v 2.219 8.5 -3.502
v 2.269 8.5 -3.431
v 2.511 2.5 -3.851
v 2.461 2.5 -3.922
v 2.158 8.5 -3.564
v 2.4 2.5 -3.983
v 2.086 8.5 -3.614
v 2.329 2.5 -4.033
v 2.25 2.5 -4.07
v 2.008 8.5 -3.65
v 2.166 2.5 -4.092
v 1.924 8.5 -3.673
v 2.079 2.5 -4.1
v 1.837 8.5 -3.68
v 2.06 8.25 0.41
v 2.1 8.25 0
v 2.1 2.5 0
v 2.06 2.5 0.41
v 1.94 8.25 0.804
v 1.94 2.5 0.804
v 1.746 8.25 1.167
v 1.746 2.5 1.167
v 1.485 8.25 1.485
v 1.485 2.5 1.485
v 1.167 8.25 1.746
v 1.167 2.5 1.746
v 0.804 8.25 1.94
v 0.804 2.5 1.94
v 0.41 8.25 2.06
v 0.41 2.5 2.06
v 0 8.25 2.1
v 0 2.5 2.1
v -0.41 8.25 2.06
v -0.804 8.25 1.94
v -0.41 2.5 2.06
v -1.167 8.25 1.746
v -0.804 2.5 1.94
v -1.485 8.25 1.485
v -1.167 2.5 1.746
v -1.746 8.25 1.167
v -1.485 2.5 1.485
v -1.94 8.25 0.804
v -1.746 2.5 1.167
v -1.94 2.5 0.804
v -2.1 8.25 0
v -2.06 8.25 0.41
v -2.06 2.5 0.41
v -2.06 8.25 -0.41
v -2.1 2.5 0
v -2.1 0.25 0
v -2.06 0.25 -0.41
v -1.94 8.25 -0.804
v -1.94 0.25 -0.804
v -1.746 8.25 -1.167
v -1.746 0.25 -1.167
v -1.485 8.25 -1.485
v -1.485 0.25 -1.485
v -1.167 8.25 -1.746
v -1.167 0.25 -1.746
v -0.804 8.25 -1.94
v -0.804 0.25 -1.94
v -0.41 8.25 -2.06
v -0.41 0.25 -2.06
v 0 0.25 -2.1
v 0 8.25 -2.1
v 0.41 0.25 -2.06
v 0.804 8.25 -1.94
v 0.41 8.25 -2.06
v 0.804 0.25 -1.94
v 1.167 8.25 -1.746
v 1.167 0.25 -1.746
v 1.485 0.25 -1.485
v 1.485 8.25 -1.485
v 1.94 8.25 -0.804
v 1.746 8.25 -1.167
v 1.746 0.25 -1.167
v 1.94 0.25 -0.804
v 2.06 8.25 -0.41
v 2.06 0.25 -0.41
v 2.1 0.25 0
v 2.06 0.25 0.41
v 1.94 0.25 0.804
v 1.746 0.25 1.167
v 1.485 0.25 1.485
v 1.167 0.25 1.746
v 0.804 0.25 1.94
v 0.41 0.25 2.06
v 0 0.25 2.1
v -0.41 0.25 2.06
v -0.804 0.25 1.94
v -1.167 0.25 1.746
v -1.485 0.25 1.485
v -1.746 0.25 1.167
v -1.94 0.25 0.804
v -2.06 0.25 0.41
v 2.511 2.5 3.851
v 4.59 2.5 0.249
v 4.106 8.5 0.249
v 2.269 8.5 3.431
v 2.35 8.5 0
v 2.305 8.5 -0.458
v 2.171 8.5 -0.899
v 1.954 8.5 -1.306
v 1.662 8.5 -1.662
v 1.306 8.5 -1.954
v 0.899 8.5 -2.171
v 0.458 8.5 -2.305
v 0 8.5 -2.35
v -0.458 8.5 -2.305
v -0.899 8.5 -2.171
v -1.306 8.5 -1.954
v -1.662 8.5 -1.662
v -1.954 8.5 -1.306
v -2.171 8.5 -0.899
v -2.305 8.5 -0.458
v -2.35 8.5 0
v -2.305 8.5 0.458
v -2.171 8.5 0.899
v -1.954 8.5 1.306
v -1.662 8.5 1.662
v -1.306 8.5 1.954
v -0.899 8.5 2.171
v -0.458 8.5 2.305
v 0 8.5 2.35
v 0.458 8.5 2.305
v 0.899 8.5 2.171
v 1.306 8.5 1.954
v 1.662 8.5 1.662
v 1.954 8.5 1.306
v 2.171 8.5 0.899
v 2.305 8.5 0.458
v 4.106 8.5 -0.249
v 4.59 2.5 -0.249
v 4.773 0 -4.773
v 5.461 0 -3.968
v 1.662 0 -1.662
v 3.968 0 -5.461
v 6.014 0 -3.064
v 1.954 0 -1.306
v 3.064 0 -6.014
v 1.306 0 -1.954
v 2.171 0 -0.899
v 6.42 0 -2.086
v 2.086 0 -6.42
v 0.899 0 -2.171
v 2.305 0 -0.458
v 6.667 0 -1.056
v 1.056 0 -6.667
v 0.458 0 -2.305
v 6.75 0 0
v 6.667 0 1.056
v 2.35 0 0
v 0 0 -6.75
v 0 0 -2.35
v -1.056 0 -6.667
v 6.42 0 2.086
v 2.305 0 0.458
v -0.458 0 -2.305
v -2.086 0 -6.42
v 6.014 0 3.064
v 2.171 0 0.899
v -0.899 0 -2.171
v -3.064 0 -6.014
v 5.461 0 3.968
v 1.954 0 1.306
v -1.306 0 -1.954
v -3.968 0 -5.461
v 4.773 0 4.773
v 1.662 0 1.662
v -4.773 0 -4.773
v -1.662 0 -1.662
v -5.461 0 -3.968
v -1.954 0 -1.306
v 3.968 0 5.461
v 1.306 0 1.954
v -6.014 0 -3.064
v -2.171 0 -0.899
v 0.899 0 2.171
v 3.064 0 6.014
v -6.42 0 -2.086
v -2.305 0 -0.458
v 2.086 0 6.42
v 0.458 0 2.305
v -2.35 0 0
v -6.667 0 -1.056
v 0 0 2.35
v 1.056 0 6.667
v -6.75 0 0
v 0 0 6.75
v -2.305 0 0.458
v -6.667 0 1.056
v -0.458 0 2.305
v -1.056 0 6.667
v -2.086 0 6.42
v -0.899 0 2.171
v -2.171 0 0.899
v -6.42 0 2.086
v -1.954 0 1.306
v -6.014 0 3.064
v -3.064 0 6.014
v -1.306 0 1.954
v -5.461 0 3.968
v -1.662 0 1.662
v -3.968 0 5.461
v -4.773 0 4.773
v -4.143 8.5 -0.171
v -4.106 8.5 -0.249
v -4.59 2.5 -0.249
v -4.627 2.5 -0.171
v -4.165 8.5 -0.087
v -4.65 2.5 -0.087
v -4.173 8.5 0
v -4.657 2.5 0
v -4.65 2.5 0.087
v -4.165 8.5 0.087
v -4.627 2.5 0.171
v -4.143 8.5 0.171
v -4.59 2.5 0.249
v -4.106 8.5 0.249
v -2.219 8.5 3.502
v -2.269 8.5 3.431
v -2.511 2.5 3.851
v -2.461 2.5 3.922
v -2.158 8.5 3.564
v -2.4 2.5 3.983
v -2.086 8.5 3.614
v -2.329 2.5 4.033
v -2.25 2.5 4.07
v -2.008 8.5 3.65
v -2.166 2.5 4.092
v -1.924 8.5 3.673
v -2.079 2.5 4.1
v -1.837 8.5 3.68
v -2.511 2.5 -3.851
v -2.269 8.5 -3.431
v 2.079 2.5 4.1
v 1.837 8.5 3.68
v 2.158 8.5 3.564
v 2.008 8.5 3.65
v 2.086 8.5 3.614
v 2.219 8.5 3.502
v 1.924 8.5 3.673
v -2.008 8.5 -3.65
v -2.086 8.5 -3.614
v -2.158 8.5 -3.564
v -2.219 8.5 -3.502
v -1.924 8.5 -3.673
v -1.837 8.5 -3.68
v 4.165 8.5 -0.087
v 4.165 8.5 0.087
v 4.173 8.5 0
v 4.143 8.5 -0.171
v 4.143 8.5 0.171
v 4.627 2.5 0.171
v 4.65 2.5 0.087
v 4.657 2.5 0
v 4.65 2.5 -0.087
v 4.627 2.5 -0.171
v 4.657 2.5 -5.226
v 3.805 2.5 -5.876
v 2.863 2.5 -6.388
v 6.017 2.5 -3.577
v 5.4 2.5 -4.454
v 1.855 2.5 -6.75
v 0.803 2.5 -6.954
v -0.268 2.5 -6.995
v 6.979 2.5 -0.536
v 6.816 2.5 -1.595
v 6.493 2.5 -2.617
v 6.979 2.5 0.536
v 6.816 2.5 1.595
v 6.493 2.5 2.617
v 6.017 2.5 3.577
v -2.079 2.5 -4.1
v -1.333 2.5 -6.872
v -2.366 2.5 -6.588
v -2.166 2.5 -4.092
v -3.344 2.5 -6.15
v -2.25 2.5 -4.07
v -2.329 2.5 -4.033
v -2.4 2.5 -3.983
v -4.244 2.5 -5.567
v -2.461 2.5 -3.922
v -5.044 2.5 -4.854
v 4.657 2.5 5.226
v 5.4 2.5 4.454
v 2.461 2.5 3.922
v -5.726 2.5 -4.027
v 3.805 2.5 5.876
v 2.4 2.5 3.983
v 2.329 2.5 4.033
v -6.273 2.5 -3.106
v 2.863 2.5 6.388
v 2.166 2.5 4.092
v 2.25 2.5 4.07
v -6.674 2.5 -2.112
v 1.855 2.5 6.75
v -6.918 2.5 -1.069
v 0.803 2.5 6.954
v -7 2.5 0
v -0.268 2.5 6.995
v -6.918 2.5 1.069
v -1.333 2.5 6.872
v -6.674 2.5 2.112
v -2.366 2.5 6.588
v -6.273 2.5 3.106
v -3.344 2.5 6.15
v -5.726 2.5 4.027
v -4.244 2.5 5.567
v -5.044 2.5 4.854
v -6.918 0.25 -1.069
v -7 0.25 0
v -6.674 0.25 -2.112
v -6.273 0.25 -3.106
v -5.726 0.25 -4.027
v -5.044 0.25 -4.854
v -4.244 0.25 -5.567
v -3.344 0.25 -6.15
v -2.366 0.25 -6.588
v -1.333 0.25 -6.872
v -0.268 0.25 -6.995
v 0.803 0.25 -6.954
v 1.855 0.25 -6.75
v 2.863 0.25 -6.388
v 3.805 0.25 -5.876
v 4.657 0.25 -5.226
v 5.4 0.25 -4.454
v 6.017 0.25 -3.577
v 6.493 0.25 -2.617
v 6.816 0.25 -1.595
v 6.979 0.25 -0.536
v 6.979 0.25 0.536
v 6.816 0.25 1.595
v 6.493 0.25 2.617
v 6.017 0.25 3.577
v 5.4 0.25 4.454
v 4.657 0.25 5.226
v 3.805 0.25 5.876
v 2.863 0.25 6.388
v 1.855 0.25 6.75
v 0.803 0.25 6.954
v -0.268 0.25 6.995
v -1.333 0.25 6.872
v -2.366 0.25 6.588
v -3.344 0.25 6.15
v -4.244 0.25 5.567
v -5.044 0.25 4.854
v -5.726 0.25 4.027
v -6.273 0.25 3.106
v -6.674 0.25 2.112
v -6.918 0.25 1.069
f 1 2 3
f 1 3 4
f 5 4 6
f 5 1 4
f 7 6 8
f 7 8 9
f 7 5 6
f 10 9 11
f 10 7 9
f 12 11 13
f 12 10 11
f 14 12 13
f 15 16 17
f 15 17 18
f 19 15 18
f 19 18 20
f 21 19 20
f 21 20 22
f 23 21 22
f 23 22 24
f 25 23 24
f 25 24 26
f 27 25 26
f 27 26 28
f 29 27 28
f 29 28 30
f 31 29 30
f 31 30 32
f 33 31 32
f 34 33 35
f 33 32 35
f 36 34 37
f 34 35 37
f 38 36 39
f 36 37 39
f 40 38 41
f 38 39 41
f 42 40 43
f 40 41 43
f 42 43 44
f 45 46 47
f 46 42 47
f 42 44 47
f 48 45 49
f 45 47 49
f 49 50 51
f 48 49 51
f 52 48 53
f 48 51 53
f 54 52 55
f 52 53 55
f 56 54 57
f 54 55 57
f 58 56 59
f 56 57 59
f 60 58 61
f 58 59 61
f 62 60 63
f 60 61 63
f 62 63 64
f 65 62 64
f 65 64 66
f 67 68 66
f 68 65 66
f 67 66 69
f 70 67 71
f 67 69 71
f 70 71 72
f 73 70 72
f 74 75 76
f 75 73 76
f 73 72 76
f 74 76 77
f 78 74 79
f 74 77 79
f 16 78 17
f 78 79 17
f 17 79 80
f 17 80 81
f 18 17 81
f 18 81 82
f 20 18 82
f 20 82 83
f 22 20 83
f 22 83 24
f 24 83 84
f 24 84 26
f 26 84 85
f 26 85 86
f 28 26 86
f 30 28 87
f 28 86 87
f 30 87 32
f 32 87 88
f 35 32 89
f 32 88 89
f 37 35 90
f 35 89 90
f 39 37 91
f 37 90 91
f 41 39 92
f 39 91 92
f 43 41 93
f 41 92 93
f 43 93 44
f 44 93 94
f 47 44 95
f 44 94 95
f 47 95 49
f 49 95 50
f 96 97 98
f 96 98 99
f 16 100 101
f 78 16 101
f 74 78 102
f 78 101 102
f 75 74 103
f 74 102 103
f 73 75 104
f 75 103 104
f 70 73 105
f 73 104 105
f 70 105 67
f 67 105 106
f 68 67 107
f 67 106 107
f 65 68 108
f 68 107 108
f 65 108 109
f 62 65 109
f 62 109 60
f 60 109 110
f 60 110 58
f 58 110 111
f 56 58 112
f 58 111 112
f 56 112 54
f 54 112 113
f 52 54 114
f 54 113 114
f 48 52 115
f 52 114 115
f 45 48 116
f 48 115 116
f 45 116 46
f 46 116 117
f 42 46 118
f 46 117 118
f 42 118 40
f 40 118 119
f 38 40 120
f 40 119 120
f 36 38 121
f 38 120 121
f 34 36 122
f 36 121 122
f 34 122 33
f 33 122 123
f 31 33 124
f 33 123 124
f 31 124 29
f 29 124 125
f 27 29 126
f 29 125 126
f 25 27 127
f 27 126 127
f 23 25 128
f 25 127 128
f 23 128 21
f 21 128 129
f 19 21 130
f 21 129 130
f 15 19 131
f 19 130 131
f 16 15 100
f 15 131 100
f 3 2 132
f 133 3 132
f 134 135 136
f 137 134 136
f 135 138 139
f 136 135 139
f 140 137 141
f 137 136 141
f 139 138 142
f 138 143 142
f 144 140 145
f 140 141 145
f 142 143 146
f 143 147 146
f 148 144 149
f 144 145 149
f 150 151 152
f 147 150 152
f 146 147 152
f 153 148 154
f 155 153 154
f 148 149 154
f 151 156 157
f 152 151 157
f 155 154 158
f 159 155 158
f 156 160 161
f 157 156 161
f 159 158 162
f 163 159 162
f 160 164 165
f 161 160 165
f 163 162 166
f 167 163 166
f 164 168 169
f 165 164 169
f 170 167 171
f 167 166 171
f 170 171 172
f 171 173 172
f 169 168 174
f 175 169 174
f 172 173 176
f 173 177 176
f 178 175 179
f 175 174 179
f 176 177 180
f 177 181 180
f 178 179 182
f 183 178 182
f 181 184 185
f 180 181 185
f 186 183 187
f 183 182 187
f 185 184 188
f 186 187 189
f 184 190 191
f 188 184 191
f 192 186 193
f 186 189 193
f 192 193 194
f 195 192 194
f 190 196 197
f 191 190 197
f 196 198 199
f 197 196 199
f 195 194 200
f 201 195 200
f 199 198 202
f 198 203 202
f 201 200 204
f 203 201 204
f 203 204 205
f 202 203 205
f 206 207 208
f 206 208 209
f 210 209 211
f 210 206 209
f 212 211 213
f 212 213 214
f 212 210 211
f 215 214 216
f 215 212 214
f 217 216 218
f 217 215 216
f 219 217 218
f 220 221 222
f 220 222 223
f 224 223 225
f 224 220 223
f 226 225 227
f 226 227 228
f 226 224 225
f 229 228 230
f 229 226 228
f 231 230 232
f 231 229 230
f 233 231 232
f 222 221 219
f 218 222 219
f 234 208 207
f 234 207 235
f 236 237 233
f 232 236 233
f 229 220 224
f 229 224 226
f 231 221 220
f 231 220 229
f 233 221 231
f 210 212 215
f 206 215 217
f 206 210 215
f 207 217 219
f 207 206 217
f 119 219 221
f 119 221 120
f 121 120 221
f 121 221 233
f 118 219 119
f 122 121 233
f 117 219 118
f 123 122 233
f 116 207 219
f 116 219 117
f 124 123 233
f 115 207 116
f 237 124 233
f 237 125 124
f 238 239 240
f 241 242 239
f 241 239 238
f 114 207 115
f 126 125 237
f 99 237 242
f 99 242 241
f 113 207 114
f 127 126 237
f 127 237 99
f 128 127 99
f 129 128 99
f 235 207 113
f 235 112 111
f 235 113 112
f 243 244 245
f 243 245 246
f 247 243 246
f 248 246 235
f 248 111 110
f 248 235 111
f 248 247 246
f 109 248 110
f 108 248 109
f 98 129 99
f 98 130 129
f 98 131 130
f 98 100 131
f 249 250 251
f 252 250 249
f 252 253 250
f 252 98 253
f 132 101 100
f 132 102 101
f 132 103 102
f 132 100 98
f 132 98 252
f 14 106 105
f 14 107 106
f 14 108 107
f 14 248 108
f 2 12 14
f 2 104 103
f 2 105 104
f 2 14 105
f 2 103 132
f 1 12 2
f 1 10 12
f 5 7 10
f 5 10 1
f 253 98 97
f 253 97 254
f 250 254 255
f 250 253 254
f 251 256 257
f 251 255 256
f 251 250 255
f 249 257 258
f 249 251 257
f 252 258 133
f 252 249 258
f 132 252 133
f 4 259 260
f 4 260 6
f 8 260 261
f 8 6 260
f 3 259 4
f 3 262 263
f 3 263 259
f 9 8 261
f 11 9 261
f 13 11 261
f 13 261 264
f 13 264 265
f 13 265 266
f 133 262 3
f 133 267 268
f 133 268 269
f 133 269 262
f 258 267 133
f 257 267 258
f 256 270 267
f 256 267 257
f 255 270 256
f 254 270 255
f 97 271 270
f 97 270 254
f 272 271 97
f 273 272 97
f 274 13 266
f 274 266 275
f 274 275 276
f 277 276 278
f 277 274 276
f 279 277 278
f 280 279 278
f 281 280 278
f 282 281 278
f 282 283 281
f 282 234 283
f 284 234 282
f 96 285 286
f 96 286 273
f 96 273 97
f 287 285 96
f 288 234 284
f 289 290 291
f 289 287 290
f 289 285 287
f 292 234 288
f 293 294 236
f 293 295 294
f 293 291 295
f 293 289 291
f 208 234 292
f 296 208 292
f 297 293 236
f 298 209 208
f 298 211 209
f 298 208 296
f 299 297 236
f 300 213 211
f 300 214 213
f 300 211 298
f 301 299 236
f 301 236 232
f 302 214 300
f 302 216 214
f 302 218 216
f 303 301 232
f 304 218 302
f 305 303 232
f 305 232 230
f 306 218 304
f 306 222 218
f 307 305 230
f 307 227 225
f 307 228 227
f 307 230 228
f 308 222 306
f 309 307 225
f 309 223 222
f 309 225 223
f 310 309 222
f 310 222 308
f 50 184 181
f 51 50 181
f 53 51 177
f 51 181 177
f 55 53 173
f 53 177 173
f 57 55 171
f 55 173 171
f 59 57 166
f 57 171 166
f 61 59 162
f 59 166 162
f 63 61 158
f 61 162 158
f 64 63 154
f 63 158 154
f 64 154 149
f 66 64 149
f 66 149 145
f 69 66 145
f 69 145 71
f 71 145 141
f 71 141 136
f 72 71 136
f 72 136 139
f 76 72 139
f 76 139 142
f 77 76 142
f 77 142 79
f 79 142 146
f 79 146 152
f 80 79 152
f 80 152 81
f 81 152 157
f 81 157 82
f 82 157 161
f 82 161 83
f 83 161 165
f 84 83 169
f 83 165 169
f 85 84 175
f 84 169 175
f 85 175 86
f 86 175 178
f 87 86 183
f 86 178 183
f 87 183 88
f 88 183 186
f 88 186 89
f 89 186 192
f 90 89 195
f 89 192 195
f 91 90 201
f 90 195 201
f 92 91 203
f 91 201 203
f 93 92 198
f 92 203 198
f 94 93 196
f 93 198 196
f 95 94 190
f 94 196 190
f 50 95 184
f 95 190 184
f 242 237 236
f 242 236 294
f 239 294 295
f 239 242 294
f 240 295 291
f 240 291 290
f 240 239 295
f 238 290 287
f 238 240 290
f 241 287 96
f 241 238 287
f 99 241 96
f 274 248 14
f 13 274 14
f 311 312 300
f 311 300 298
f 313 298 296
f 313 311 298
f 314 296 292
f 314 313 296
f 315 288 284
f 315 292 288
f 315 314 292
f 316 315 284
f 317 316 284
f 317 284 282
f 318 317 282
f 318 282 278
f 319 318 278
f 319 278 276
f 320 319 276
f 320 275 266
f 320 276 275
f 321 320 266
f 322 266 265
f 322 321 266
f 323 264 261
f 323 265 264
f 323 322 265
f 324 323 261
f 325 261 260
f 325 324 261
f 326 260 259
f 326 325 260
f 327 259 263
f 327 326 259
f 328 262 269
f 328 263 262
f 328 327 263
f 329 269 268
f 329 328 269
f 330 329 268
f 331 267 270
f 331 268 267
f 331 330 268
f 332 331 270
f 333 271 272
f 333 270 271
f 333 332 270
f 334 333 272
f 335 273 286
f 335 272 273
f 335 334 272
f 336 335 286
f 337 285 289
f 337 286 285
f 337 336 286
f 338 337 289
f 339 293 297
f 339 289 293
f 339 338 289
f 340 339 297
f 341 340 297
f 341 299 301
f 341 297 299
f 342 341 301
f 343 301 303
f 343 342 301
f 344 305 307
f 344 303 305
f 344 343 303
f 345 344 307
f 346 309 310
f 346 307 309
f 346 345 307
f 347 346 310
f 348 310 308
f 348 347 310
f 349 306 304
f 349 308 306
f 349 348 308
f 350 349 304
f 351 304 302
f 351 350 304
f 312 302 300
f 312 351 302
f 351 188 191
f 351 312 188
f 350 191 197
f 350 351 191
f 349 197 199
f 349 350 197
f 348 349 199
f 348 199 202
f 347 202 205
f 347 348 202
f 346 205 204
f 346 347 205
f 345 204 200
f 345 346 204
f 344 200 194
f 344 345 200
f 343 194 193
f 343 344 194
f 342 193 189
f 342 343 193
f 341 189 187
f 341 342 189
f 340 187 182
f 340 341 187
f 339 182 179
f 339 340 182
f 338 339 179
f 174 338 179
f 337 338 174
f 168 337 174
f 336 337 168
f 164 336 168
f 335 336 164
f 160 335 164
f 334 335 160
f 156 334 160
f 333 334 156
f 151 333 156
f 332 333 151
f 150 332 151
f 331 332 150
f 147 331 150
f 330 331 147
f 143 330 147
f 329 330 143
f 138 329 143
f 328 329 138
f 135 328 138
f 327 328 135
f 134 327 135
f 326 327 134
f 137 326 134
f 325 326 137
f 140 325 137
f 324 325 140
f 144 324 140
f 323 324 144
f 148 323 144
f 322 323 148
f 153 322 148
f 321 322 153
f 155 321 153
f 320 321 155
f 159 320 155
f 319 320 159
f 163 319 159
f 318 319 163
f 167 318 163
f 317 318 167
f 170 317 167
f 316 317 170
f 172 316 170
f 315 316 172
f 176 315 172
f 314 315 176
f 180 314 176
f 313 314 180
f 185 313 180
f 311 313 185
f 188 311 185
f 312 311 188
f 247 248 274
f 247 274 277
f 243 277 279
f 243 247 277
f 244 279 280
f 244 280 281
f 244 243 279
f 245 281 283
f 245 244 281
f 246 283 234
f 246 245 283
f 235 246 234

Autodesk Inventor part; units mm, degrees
ref_plane "YZ Plane" through (0, 0, 0) normal (1, 0, 0) x (0, 1, 0)
ref_plane "XZ Plane" through (0, 0, 0) normal (0, 1, 0) x (-1, 0, 0)
ref_plane "XY Plane" through (0, 0, 0) normal (0, 0, 1) x (1, 0, 0)
sketch "Sketch1" plane through (0, 0, 0) normal (0, 1, 0) x (-1, 0, 0)
  circle A0 centre (0, 0) radius 7
  circle A1 centre (0, 0) radius 2.1
  dimension "d0" = 14
  dimension "d1" = 4.2
extrude "Extrusion1" add sketch "Sketch1" along normal blind 2.5
sketch "Sketch2" plane through (0, 2.5, 0) normal (0, 1, 0) x (1, 0, 0)
  circle A0 centre (0, 0) radius 2.1
  line L0 (4.7343, 0) -> (2.3671, -4.1)
  line L1 (2.3671, -4.1) -> (-2.3671, -4.1)
  line L2 (-2.3671, -4.1) -> (-4.7343, 0)
  line L3 (-4.7343, 0) -> (-2.3671, 4.1)
  line L4 (-2.3671, 4.1) -> (2.3671, 4.1)
  line L5 (2.3671, 4.1) -> (4.7343, 0)
  dimension "d10" = 2
  dimension "d11" = 4.2
extrude "Extrusion2" add sketch "Sketch2" along normal blind 6
chamfer "Chamfer1" distance 0.25 angle 45 3 edges at (7, 0, 0) (-2.1, 8.5, 0) (2.1, 0, 0)
draft "FaceDraft1" angle 4 pull direction (0, 1, 0) faces at (3.1562, 4.5, 2.7333) (-0.789, 4.5, 4.1) (3.9452, 4.5, -1.3667) (-3.9452, 4.5, 1.3667) (-3.1562, 4.5, -2.7333) (0.789, 4.5, -4.1) fixed edges at (3.5507, 2.5, 2.05) (0, 2.5, 4.1) (3.5507, 2.5, -2.05) (-3.5507, 2.5, 2.05) (-3.5507, 2.5, -2.05) (0, 2.5, -4.1)
fillet "Fillet1" radius 0.5 6 edges at (2.246, 5.5, -3.8902) (-2.246, 5.5, 3.8902) (2.246, 5.5, 3.8902) (-2.246, 5.5, -3.8902) (4.492, 5.5, 0) (-4.492, 5.5, 0)
properties part number "TeflonHolderWasher"
